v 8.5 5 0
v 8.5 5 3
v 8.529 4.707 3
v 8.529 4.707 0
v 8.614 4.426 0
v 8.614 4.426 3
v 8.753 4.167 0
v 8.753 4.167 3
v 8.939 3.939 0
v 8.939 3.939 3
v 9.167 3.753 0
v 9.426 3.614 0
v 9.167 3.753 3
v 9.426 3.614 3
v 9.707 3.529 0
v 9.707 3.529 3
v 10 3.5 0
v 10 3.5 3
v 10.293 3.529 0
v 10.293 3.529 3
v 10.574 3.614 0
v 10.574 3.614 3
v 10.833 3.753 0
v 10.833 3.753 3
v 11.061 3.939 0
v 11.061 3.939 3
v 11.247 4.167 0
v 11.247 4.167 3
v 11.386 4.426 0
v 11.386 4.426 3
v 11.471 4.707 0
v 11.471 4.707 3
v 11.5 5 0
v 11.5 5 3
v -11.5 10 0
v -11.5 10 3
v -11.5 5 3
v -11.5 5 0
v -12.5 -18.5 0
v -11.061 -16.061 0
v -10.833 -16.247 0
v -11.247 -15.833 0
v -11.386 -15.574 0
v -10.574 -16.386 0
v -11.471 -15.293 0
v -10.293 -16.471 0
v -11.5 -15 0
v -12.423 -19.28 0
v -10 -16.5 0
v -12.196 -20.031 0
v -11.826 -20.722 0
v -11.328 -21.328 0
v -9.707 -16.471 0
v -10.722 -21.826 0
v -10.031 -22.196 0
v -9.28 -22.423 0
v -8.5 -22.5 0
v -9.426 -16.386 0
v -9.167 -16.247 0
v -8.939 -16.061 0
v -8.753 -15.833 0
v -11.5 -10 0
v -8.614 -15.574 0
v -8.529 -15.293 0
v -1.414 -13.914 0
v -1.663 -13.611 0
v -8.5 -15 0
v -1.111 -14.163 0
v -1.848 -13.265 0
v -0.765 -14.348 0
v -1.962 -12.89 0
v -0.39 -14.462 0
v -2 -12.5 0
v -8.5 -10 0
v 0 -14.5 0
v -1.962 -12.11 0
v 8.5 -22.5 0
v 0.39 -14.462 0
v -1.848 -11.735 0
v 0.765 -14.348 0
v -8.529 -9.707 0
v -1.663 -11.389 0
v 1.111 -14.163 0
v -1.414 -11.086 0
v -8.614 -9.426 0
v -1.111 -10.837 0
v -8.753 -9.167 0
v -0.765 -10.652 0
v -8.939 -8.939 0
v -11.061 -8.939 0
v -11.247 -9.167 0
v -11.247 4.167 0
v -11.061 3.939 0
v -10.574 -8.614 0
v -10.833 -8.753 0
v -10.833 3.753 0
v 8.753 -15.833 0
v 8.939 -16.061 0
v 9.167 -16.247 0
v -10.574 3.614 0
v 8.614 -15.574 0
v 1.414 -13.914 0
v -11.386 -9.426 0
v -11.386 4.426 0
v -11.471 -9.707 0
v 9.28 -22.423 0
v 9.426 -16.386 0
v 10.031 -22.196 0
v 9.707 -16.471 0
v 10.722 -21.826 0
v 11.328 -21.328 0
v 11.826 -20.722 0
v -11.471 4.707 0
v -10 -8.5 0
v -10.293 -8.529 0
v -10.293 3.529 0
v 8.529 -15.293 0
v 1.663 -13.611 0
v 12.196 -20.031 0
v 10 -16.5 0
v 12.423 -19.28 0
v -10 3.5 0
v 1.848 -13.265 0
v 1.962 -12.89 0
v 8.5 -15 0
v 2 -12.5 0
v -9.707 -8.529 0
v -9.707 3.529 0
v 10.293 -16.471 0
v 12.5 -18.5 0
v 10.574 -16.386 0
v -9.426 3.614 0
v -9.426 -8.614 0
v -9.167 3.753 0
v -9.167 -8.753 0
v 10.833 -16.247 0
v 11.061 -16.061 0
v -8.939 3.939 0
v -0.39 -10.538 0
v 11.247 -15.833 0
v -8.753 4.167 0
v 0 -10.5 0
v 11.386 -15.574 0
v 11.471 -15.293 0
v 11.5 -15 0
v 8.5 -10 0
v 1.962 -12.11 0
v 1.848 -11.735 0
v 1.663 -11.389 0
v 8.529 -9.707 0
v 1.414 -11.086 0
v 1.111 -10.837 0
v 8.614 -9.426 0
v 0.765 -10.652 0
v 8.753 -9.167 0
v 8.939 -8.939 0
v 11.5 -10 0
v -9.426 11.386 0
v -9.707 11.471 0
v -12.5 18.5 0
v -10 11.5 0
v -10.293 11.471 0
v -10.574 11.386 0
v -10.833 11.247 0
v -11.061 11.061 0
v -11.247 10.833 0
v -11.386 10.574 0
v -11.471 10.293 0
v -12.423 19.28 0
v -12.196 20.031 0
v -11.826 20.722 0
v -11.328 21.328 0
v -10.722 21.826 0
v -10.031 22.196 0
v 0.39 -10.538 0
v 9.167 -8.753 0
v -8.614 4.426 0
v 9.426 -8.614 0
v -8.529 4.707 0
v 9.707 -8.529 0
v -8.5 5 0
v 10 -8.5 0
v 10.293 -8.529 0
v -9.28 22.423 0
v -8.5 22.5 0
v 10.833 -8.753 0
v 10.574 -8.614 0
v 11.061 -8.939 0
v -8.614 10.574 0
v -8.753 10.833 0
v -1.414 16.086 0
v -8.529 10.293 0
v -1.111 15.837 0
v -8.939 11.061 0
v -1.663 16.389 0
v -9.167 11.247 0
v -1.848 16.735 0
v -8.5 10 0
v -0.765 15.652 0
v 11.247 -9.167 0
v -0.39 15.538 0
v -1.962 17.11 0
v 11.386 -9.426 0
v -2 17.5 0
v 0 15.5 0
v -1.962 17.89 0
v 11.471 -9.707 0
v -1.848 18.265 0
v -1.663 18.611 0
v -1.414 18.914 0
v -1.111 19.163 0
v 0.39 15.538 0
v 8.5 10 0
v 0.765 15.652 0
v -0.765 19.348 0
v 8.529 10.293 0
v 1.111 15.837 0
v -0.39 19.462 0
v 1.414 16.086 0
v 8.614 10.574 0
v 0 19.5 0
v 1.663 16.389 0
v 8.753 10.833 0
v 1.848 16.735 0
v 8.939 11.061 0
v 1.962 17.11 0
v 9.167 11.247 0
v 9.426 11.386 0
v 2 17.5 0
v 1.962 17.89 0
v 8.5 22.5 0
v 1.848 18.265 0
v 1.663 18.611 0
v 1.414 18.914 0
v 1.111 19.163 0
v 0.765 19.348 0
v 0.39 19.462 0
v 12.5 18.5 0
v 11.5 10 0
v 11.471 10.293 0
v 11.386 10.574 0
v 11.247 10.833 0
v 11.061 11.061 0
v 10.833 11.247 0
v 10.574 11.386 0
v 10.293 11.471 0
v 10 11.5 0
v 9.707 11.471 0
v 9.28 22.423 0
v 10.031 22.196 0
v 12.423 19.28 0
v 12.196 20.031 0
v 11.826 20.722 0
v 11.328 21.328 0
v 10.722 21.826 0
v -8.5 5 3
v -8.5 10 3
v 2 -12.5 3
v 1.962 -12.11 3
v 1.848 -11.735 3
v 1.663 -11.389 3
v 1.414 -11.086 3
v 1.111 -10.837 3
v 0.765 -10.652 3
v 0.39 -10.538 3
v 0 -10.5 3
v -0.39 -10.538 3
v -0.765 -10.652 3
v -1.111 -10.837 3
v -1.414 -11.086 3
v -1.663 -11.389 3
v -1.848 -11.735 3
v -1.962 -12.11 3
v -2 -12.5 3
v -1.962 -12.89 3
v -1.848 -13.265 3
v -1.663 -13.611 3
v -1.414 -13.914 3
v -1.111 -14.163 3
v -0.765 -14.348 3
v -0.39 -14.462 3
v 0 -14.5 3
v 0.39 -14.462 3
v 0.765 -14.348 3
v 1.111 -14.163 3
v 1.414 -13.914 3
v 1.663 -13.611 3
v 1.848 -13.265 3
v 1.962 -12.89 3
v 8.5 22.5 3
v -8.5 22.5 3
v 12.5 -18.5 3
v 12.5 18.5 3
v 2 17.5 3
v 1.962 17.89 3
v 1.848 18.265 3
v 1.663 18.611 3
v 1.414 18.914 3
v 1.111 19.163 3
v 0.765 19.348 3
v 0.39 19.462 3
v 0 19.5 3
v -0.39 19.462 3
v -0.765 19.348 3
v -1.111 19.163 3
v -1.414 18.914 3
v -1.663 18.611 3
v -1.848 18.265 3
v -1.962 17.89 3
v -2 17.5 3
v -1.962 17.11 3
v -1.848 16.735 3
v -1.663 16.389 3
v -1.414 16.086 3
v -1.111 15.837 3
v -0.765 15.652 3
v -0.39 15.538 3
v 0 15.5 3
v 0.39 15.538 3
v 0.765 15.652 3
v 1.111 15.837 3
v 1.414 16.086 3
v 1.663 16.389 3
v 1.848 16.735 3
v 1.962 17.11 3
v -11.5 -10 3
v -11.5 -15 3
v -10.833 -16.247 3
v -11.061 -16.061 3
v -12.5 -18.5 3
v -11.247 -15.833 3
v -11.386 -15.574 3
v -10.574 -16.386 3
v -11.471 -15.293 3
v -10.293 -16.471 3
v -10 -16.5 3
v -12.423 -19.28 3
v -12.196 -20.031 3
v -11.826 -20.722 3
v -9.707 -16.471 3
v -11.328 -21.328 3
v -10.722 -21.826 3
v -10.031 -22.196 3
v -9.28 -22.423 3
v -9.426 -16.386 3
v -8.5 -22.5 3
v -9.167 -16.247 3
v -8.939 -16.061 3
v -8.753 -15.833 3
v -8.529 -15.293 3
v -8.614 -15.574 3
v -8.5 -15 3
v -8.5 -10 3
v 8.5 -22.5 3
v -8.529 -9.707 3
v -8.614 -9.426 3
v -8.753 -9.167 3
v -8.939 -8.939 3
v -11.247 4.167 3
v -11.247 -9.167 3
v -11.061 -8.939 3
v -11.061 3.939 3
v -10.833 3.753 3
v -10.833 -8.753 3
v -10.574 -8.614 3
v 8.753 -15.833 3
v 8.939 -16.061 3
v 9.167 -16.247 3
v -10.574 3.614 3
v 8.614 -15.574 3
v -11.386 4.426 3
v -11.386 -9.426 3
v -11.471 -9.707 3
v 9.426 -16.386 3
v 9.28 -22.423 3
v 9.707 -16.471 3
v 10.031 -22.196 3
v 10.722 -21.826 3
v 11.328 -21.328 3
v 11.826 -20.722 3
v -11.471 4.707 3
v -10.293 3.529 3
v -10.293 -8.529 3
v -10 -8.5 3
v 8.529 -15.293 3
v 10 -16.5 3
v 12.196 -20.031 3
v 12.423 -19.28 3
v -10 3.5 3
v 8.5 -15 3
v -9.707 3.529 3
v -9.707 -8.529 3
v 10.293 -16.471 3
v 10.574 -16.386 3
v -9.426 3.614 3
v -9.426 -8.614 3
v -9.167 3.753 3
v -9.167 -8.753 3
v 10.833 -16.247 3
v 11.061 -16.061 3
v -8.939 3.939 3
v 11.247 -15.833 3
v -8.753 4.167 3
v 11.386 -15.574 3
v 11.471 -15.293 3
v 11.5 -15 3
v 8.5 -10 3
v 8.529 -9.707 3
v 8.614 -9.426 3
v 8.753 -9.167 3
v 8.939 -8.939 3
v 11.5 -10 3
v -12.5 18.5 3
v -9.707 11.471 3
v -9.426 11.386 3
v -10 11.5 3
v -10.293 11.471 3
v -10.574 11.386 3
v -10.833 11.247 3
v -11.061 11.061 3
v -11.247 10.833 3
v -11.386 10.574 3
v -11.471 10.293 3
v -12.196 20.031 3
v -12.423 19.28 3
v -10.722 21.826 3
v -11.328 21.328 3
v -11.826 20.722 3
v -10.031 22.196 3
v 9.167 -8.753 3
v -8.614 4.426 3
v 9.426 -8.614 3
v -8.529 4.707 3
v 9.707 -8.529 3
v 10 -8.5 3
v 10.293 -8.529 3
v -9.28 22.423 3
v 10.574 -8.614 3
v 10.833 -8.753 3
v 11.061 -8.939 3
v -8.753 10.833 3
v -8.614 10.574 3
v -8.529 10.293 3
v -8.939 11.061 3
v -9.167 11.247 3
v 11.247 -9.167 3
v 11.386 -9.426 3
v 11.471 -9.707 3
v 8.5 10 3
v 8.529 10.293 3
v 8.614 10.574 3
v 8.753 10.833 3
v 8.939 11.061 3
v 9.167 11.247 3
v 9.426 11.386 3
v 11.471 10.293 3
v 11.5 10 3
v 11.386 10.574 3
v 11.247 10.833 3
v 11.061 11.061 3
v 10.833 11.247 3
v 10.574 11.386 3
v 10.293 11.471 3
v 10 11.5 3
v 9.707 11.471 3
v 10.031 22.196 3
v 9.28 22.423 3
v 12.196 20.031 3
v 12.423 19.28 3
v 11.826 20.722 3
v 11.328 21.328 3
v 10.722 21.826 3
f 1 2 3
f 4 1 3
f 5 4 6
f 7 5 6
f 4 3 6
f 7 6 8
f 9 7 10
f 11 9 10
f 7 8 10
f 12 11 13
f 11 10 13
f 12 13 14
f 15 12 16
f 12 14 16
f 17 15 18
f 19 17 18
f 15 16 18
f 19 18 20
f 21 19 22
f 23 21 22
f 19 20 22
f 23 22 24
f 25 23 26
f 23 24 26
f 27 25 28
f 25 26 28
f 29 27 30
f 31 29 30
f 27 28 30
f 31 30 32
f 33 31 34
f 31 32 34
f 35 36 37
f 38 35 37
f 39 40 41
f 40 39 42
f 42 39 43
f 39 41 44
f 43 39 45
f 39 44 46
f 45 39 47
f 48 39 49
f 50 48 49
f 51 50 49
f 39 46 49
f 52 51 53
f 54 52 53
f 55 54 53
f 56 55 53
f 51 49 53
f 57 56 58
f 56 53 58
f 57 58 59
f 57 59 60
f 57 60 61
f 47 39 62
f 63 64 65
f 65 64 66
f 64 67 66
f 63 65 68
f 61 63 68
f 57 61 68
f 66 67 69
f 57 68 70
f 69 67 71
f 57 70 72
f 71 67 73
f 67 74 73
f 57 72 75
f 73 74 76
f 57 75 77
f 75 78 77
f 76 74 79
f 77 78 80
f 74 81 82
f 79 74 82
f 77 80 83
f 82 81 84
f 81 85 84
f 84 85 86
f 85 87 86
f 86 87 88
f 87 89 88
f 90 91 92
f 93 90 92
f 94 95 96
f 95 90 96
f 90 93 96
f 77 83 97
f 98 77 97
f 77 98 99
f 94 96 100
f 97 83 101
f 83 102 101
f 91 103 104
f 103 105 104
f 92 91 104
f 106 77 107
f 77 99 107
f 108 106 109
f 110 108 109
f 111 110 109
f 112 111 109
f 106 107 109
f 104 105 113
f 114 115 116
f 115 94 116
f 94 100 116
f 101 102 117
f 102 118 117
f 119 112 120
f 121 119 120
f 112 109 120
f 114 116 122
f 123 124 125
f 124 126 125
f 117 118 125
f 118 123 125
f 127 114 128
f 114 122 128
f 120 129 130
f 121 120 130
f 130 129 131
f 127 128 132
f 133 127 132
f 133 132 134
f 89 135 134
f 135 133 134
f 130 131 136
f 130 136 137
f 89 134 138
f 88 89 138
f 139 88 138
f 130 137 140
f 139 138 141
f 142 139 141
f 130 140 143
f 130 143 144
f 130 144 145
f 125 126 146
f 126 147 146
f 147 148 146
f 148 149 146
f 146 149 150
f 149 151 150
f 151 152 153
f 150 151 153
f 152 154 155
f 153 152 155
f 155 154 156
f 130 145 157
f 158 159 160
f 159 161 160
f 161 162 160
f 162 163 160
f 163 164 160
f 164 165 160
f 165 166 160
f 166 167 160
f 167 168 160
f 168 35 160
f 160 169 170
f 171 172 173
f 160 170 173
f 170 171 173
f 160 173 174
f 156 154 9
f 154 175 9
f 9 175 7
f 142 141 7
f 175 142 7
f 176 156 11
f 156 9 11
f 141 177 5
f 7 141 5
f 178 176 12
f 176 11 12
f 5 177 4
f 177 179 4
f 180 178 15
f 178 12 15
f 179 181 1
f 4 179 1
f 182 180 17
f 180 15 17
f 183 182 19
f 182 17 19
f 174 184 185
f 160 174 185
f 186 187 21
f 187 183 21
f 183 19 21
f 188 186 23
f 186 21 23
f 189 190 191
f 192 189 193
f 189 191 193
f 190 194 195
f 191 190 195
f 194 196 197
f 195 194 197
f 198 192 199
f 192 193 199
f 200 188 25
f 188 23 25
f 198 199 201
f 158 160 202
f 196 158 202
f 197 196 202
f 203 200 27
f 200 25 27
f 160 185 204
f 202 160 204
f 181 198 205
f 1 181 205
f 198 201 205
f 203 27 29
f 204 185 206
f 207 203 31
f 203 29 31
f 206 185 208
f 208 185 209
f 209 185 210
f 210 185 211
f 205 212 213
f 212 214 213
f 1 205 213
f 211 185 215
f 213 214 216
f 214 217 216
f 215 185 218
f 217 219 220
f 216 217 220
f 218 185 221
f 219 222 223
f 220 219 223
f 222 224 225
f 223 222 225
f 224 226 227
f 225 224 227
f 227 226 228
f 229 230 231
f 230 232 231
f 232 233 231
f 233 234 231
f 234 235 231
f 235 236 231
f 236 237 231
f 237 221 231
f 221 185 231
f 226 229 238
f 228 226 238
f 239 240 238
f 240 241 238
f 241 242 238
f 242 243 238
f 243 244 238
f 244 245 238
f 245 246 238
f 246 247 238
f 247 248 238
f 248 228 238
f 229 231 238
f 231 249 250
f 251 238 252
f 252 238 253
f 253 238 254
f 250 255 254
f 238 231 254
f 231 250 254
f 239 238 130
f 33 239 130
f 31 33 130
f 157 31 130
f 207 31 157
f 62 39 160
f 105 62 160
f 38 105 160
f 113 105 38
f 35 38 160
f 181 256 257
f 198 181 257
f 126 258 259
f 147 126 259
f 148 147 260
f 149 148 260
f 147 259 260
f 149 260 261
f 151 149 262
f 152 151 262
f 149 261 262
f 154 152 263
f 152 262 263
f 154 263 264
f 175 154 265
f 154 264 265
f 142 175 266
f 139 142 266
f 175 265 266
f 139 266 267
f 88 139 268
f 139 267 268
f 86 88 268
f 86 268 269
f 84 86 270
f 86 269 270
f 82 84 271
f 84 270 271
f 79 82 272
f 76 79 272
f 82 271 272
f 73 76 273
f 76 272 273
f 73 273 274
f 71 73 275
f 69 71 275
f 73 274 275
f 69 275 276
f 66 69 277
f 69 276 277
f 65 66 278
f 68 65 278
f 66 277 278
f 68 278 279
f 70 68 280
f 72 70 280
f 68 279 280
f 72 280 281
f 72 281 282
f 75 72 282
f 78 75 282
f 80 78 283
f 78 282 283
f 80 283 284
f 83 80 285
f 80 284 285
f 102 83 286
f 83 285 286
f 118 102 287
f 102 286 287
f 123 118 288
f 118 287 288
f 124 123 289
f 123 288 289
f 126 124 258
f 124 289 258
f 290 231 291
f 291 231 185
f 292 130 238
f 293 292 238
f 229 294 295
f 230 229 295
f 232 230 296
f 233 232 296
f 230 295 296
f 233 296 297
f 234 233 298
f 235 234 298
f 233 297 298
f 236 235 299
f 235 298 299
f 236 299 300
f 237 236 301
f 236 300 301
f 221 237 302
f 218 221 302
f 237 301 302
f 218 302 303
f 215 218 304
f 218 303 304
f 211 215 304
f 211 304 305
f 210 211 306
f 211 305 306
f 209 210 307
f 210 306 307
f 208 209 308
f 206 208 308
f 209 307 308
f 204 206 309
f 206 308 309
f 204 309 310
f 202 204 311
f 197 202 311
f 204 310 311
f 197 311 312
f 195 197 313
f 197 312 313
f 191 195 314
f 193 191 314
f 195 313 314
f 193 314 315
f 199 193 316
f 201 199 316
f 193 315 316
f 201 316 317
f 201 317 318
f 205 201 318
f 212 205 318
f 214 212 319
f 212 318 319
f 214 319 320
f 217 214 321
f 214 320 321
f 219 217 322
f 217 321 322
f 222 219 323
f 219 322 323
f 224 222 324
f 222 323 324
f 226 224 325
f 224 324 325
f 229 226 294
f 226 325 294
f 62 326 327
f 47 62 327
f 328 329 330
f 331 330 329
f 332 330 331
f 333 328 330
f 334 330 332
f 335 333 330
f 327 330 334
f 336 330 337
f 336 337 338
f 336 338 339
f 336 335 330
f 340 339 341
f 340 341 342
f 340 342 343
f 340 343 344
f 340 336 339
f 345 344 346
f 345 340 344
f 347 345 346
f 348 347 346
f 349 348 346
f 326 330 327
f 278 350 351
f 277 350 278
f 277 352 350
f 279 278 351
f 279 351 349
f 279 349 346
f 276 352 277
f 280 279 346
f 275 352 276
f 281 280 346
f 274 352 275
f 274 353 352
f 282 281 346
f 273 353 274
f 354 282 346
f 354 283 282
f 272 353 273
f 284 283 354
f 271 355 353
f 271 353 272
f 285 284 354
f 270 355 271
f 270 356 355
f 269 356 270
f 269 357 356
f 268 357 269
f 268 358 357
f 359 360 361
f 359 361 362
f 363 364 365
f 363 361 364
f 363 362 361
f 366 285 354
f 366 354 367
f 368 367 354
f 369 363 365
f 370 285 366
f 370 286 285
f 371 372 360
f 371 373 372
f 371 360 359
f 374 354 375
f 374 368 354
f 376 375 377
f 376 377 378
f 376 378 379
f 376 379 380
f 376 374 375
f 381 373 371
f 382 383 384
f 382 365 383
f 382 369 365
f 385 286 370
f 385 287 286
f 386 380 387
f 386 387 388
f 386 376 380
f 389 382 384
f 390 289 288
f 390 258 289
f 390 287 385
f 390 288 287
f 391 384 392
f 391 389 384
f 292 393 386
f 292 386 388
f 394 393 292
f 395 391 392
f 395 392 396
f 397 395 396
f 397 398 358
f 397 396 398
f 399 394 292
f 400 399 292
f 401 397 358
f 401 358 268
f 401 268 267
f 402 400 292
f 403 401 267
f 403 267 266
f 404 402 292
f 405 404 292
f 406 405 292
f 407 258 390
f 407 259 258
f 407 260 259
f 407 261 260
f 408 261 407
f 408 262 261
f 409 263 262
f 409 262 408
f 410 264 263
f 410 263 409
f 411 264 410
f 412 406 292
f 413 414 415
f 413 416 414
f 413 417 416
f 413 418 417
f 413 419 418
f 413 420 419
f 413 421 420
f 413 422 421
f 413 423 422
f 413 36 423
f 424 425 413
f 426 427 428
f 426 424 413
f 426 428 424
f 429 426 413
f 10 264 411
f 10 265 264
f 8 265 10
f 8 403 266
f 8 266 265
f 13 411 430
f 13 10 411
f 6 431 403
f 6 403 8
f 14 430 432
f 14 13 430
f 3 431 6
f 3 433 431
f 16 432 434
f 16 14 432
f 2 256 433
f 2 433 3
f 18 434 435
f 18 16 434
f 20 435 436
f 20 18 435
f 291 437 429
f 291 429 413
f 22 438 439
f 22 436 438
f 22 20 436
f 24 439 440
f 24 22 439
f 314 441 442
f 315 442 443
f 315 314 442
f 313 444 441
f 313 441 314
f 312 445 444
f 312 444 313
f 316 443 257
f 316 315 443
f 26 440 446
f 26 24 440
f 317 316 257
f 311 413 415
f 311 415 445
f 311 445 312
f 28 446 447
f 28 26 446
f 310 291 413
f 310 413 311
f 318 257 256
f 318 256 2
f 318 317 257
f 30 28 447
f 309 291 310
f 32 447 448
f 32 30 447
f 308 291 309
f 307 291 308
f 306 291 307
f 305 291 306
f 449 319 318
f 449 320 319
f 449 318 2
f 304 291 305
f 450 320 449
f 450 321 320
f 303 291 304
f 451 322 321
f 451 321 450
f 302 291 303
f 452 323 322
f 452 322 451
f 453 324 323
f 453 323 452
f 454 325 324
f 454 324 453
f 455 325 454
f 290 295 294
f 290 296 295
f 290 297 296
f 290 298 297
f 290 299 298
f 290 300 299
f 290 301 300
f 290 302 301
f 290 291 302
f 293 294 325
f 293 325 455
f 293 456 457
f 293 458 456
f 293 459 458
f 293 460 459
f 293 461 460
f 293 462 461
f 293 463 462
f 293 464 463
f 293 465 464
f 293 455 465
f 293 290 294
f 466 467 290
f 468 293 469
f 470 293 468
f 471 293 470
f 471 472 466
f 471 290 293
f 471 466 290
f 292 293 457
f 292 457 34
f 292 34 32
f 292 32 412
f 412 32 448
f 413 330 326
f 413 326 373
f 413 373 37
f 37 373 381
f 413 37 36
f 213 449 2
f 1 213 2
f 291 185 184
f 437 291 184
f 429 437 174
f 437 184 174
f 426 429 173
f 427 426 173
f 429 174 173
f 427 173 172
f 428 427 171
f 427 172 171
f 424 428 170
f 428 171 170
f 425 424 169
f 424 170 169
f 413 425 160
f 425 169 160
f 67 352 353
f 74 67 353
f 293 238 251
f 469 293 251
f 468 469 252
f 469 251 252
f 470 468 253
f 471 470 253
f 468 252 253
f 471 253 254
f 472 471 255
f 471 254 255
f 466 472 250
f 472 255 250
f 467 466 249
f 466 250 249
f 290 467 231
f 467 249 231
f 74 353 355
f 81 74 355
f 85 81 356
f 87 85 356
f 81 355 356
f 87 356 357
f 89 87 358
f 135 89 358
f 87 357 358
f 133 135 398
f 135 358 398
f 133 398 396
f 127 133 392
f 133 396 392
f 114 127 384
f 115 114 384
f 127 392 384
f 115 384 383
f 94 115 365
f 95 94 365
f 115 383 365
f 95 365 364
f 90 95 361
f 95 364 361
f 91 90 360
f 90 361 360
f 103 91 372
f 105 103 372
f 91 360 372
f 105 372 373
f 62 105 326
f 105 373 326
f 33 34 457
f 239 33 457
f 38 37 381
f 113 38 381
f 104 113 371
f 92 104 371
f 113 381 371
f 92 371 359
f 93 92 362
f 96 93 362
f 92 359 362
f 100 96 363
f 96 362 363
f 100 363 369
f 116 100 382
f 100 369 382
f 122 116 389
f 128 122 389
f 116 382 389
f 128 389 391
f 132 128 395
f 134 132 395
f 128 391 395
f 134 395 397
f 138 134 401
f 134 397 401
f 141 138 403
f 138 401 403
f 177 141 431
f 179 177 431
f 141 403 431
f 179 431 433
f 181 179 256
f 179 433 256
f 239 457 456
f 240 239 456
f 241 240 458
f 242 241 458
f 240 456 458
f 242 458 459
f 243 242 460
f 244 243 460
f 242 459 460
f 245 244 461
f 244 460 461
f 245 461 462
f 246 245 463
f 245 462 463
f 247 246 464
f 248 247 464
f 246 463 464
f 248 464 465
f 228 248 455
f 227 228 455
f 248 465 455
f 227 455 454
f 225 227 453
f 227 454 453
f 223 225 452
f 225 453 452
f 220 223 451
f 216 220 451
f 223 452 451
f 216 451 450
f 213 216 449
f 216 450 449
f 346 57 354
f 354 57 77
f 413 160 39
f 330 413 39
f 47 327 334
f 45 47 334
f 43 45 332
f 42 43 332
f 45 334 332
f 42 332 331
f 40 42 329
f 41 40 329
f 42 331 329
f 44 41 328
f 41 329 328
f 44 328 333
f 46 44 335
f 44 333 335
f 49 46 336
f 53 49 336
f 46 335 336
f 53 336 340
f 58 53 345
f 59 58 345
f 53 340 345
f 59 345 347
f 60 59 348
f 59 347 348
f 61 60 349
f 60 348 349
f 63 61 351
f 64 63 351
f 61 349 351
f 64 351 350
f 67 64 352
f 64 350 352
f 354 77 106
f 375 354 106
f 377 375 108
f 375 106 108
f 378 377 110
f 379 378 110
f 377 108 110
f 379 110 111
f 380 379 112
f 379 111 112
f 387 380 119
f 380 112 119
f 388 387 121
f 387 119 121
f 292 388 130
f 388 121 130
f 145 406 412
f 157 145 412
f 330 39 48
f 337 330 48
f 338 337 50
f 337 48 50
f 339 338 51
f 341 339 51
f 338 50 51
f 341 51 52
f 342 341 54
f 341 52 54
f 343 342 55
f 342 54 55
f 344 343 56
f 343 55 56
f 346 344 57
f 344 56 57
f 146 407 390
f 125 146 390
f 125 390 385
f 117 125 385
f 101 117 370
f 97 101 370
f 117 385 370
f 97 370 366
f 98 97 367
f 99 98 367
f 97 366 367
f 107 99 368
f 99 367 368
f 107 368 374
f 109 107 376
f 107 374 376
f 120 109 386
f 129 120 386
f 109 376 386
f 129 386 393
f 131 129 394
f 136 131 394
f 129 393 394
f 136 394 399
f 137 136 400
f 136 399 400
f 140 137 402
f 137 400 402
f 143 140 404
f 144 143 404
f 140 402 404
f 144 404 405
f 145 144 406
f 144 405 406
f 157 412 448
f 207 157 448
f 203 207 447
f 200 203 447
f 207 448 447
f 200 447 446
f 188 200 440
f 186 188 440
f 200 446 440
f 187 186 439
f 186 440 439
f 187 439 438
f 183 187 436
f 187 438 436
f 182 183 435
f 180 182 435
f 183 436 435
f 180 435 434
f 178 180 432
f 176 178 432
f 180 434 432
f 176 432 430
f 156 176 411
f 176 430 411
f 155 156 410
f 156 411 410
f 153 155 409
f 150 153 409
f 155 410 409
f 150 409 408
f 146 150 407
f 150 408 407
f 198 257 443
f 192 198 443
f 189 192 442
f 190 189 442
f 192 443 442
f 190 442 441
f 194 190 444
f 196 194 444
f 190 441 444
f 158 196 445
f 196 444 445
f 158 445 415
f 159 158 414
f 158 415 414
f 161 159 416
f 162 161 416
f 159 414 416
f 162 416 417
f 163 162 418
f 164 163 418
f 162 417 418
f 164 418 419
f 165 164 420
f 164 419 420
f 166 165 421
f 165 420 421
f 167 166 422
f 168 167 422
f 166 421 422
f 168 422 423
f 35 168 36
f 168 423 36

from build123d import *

# Parameters (mm, degrees)
F1_DEPTH = 3
F2_R     = 2
F3_DEPTH = 3


with BuildPart() as f1:
    # F0 (on Top) → F1 (new body)
    with BuildSketch(Plane.XY):
        with BuildLine():
            Line((-8.5, -22.5), (8.5, -22.5))
            ThreePointArc((8.5, -22.5), (11.328427, -21.328427), (12.5, -18.5))
            Line((12.5, -18.5), (12.5, 18.5))
            ThreePointArc((12.5, 18.5), (11.328427, 21.328427), (8.5, 22.5))
            Line((8.5, 22.5), (-8.5, 22.5))
            ThreePointArc((-8.5, 22.5), (-11.328427, 21.328427), (-12.5, 18.5))
            Line((-12.5, 18.5), (-12.5, -18.5))
            ThreePointArc((-12.5, -18.5), (-11.328427, -21.328427), (-8.5, -22.5))
        make_face()
    extrude(amount=F1_DEPTH)

    # F2 (on face) → F3 (cut, through all)
    with BuildSketch(Plane.XY.offset(3)):
        with Locations((0, -12.5)):
            Circle(F2_R)
        with Locations((0, 17.5)):
            Circle(F2_R)
        with BuildLine():
            ThreePointArc((-8.5, 10), (-10, 11.5), (-11.5, 10))
            Line((-11.5, 10), (-11.5, 5))
            ThreePointArc((-11.5, 5), (-10, 3.5), (-8.5, 5))
            Line((-8.5, 5), (-8.5, 10))
        make_face()
        with BuildLine():
            ThreePointArc((11.5, 10), (10, 11.5), (8.5, 10))
            Line((8.5, 10), (8.5, 5))
            ThreePointArc((8.5, 5), (10, 3.5), (11.5, 5))
            Line((11.5, 5), (11.5, 10))
        make_face()
        with BuildLine():
            ThreePointArc((11.5, -10), (10, -8.5), (8.5, -10))
            Line((8.5, -10), (8.5, -15))
            ThreePointArc((8.5, -15), (10, -16.5), (11.5, -15))
            Line((11.5, -15), (11.5, -10))
        make_face()
        with BuildLine():
            ThreePointArc((-8.5, -10), (-10, -8.5), (-11.5, -10))
            Line((-11.5, -10), (-11.5, -15))
            ThreePointArc((-11.5, -15), (-10, -16.5), (-8.5, -15))
            Line((-8.5, -15), (-8.5, -10))
        make_face()
    extrude(amount=-F3_DEPTH, mode=Mode.SUBTRACT)


solid = f1.part
